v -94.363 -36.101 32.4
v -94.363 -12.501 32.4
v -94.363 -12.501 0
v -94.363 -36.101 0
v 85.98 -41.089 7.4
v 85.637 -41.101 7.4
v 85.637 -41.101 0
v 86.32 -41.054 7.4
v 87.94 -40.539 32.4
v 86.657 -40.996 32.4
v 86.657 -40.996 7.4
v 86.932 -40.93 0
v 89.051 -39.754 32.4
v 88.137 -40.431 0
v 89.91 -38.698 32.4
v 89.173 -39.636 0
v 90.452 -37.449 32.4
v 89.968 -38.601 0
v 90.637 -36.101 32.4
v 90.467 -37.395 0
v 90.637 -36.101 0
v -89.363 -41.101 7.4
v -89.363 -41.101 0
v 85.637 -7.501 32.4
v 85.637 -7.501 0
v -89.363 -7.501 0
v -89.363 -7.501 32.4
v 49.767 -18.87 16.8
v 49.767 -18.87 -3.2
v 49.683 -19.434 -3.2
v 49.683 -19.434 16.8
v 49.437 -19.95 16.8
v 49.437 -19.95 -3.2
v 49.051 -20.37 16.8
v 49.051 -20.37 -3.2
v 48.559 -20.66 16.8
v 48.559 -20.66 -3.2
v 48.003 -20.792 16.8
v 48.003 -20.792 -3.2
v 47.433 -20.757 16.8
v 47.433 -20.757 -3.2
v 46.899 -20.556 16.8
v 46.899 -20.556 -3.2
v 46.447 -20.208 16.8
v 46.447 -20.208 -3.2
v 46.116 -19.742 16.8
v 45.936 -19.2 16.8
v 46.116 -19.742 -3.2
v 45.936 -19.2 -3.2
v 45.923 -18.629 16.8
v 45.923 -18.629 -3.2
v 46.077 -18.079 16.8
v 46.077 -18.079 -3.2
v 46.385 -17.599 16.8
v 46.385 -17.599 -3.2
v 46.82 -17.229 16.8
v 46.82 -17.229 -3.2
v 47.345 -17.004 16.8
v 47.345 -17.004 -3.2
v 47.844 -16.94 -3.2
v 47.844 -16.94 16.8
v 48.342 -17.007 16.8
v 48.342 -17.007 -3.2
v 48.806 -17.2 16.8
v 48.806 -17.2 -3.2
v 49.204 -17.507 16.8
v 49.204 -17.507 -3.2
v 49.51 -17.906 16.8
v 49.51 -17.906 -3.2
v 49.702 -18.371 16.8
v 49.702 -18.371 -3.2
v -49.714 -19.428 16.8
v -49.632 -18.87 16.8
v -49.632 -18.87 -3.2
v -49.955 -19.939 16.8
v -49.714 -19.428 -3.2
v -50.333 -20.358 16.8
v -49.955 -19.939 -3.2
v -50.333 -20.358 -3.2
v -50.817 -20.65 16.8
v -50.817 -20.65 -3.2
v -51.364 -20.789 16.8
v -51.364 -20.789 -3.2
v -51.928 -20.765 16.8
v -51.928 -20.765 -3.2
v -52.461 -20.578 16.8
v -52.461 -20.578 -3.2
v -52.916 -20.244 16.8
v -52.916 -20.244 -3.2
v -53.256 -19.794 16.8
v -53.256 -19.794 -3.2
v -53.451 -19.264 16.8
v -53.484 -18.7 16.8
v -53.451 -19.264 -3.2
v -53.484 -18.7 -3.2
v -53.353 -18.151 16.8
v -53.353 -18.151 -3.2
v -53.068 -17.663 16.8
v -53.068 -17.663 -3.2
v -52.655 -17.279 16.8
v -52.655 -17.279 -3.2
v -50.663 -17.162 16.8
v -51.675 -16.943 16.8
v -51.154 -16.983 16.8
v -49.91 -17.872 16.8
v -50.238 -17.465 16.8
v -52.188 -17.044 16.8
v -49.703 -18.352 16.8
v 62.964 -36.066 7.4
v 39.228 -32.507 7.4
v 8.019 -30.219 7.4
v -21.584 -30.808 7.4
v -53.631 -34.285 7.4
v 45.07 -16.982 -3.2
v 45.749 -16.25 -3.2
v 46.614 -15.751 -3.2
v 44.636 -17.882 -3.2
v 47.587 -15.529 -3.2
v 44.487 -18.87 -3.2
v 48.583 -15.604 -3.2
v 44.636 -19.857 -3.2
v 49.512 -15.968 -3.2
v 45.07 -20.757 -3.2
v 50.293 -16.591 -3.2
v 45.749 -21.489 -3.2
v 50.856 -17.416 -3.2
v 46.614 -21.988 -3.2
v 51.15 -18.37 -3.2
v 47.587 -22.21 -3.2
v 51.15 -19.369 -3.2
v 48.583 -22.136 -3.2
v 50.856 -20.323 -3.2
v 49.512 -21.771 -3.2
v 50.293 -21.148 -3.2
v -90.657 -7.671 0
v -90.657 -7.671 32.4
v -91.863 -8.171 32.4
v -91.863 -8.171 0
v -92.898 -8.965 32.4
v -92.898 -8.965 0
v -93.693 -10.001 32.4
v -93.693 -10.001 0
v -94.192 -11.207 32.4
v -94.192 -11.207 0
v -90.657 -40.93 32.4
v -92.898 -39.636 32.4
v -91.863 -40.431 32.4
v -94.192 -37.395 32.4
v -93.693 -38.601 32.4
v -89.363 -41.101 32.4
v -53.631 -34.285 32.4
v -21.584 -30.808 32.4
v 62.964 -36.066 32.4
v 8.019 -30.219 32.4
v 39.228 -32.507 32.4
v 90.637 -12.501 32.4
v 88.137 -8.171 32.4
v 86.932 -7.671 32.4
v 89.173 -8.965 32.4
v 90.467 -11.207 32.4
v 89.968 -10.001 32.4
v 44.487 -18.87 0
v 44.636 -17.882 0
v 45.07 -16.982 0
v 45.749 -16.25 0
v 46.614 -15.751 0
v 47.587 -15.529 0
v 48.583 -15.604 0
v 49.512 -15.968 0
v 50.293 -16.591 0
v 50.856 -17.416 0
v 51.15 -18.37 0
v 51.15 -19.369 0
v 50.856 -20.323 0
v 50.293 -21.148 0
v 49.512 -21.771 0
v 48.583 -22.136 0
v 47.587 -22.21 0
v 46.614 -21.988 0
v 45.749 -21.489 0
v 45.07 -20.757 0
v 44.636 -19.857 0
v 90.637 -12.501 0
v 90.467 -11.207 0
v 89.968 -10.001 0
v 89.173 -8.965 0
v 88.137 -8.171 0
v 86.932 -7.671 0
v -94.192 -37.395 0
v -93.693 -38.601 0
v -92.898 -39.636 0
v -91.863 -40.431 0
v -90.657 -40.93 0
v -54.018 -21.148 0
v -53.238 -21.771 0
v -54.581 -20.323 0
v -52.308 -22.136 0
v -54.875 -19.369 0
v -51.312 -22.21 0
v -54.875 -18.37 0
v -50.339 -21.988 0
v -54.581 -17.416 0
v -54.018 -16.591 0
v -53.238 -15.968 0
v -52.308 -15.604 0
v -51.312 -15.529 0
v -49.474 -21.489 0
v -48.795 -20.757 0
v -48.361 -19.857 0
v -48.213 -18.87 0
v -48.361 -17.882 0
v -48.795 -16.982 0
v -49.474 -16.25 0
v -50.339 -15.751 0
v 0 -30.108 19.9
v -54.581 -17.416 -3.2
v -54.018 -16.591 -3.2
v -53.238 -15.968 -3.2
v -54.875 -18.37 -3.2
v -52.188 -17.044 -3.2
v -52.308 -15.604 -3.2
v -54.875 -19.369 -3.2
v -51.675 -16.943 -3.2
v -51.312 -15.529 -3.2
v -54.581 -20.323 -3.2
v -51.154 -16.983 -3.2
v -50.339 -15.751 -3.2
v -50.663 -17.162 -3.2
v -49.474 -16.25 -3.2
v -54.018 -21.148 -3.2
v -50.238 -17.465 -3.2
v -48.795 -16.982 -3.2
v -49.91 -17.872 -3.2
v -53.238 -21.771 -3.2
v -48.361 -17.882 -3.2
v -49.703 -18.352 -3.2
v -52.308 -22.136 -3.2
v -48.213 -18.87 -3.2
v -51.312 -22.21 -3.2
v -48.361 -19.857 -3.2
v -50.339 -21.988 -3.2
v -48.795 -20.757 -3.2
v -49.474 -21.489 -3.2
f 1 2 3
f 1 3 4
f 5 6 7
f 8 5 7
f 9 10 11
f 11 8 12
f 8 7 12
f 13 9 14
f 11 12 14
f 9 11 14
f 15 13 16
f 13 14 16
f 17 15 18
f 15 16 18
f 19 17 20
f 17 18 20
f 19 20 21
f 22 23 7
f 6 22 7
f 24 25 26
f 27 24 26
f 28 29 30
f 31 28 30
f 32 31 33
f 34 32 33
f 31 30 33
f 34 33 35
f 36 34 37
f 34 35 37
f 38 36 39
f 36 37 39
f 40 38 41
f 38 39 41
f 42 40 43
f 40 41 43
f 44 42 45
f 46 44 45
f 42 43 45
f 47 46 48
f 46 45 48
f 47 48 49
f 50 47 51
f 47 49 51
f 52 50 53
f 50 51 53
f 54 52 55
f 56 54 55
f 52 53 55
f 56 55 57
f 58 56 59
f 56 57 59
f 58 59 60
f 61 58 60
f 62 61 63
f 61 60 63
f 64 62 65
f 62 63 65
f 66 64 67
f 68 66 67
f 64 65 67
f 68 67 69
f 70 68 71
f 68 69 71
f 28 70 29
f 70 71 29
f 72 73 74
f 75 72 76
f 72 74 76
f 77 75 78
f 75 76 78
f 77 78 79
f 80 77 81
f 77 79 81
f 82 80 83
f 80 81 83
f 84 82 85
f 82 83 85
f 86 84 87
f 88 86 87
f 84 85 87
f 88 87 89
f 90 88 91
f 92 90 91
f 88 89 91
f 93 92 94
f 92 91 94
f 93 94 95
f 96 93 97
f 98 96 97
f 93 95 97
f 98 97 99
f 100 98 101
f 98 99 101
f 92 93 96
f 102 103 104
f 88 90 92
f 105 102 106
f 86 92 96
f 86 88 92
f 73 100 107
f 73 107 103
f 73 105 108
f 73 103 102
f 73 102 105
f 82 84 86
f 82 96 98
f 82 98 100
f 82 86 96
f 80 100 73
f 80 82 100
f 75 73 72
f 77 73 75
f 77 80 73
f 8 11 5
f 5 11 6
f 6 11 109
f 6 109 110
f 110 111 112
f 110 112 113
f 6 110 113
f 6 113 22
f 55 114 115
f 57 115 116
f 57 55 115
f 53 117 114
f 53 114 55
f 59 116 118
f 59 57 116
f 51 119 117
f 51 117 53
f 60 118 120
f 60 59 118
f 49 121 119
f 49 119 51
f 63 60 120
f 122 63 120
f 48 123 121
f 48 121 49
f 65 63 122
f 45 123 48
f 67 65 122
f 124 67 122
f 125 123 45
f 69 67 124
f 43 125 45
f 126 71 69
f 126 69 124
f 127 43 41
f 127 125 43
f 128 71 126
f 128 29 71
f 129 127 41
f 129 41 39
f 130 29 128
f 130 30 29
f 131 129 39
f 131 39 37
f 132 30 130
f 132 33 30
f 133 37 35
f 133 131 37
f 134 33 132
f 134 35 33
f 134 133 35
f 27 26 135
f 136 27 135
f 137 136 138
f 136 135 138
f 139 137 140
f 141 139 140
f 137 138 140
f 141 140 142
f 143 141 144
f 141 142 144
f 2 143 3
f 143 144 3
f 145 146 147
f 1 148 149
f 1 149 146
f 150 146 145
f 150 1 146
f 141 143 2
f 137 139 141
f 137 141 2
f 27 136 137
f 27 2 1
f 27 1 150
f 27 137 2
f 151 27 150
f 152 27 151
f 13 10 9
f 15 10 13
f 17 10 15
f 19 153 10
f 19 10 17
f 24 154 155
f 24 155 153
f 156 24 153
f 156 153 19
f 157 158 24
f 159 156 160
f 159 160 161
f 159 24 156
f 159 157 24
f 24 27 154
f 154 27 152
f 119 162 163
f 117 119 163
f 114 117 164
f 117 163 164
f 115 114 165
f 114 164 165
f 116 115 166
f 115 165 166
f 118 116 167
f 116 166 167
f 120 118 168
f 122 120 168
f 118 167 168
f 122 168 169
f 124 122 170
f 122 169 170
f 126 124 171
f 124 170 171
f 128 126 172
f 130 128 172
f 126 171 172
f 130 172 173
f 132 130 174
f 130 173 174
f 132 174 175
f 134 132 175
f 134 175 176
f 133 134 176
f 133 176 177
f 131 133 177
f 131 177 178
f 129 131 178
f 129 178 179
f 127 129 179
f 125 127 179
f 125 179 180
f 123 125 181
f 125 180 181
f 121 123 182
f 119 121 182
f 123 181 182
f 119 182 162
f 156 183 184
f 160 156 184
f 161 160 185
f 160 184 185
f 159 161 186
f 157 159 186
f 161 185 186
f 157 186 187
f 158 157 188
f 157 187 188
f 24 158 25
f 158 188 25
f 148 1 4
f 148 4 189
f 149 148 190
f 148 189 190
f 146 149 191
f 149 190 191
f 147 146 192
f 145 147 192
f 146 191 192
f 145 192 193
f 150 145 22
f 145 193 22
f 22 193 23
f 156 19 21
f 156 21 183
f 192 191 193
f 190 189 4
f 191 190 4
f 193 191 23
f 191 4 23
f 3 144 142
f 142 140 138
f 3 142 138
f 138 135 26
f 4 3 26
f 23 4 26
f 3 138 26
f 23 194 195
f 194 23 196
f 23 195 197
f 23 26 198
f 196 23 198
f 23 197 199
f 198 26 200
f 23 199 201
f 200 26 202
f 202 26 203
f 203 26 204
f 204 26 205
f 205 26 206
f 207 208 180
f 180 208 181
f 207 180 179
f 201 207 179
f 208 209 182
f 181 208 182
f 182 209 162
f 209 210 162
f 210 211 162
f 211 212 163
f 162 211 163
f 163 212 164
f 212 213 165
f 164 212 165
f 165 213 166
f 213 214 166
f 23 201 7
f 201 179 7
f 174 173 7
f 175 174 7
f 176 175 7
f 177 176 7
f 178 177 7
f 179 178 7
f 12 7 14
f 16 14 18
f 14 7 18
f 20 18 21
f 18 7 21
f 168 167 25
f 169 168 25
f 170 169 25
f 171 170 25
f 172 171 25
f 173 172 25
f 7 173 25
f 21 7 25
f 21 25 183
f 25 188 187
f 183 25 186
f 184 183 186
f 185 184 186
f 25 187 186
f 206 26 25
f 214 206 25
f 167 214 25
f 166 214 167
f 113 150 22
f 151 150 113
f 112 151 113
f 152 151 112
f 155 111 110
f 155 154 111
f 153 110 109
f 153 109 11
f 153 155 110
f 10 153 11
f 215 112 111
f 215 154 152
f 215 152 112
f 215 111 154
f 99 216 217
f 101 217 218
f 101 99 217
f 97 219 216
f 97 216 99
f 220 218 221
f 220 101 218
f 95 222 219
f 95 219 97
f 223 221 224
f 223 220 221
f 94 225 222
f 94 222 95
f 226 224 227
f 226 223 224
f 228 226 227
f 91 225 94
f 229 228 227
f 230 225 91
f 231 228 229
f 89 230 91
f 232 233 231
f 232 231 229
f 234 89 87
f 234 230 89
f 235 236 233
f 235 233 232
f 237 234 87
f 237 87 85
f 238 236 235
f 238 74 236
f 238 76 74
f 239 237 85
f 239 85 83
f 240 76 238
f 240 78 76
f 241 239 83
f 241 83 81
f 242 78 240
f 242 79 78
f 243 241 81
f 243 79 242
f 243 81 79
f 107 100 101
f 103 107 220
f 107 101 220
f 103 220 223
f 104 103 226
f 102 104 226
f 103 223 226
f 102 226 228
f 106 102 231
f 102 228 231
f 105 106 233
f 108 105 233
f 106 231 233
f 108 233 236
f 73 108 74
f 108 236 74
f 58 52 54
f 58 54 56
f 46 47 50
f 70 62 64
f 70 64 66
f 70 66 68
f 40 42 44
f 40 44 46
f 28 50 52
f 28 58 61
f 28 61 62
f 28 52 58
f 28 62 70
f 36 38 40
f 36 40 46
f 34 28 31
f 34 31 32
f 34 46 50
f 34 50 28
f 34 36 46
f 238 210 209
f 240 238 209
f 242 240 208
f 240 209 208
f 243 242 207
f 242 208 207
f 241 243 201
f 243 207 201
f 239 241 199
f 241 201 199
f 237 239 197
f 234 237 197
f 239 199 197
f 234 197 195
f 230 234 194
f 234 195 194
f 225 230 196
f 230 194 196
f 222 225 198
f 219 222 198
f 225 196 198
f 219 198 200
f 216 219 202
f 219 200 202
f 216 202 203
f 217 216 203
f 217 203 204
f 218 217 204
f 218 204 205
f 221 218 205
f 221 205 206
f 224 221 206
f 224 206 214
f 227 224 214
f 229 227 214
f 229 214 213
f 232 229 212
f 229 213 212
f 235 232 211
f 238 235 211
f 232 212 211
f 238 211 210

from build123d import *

# Parameters (mm, degrees)
F1_DEPTH = 32.4
F3_DEPTH = 25
F5_DEPTH = 3.2
F7_DEPTH = 20


# Not quite as in the source:
# - a feature names something its author has since deleted; it is built from what else it names


with BuildPart() as f1:
    # F0 (on Top) → F1 (new body)
    with BuildSketch(Plane.XY):
        with BuildLine():
            Line((85.6374964118, -7.5007802074), (-89.3625035882, -7.5007802074))
            ThreePointArc((-89.3625035882, -7.5007802074), (-92.8980374941, -8.9652463014), (-94.3625035882, -12.5007802074))
            Line((-94.3625035882, -12.5007802074), (-94.3625035882, -36.1007802074))
            ThreePointArc((-94.3625035882, -36.1007802074), (-92.8980374941, -39.6363141133), (-89.3625035882, -41.1007802074))
            add(Edge.make_bspline(
                [(-89.3625035882, -41.1007802074), (-59.4132024584, -34.6381396439), (-0.1322912347, -21.8461476087), (57.2468589299, -34.7273087443), (85.6374964118, -41.1007802074)],
                knots=[0, 0, 0, 0, 0.5052098646, 1, 1, 1, 1], degree=3))
            ThreePointArc((85.6374964118, -41.1007802074), (89.1730303177, -39.6363141133), (90.6374964118, -36.1007802074))
            Line((90.6374964118, -36.1007802074), (90.6374964118, -12.5007802074))
            ThreePointArc((90.6374964118, -12.5007802074), (89.1730303177, -8.9652463014), (85.6374964118, -7.5007802074))
        make_face()
        with BuildLine():
            add(Edge.make_bspline(
                [(-89.3625035882, -41.1007802074), (-59.4132024584, -34.6381396439), (-0.1322912347, -21.8461476087), (57.2468589299, -34.7273087443), (85.6374964118, -41.1007802074)],
                knots=[0, 0, 0, 0, 0.5052098646, 1, 1, 1, 1], degree=3))
            Line((-89.3625035882, -41.1007802074), (85.6374964118, -41.1007802074))
        make_face()
    extrude(amount=F1_DEPTH)

    # F2 (on face) → F3 (cut)
    with BuildSketch(Plane.XY.offset(32.4)):
        with BuildLine():
            add(Edge.make_bspline(
                [(-89.3625035882, -41.1007802074), (-59.456438476, -34.254019451), (-0.1066600814, -25.9658719218), (57.8851377231, -34.2465879534), (86.657191818, -40.9956981105)],
                knots=[0, 0, 0, 0, 0.5038023595, 1, 1, 1, 1], degree=3))
            Line((-89.3625035882, -41.1007802074), (85.6374964118, -41.1007802074))
            ThreePointArc((85.6374964118, -41.1007802074), (86.1500442068, -41.0744403041), (86.657191818, -40.9956981105))
        make_face()
    extrude(amount=-F3_DEPTH, mode=Mode.SUBTRACT)

    # F4 (on face) → F5 (join)
    with BuildSketch(Plane(origin=(0, 0, 0), x_dir=(1, 0, 0), z_dir=(0, 0, -1))):
        with BuildLine():
            Line((-51.5625035882, 18.8695881516), (-54.9125035882, 18.8695881516))
            ThreePointArc((-54.9125035882, 18.8695881516), (-51.5625035882, 15.5195881516), (-48.2125035882, 18.8695881516))
            Line((-48.2125035882, 18.8695881516), (-51.5625035882, 18.8695881516))
        make_face()
        with BuildLine():
            ThreePointArc((-48.2125035882, 18.8695881516), (-51.5625035882, 22.2195881516), (-54.9125035882, 18.8695881516))
            Line((-54.9125035882, 18.8695881516), (-51.5625035882, 18.8695881516))
            Line((-51.5625035882, 18.8695881516), (-48.2125035882, 18.8695881516))
        make_face()
        with BuildLine():
            ThreePointArc((51.1874964118, 18.8695881516), (47.8374964118, 22.2195881516), (44.4874964118, 18.8695881516))
            Line((44.4874964118, 18.8695881516), (47.8374964118, 18.8695881516))
            Line((47.8374964118, 18.8695881516), (51.1874964118, 18.8695881516))
        make_face()
        with BuildLine():
            Line((47.8374964118, 18.8695881516), (44.4874964118, 18.8695881516))
            ThreePointArc((44.4874964118, 18.8695881516), (47.8374964118, 15.5195881516), (51.1874964118, 18.8695881516))
            Line((51.1874964118, 18.8695881516), (47.8374964118, 18.8695881516))
        make_face()
    extrude(amount=F5_DEPTH)

    # F6 (on face) → F7 (cut)
    with BuildSketch(Plane(origin=(0, 0, -3.2), x_dir=(1, 0, 0), z_dir=(0, 0, -1))):
        with BuildLine():
            ThreePointArc((49.7674964118, 18.8695881516), (46.6597964296, 20.3986148851), (47.3447785341, 17.0035417714))
            ThreePointArc((47.3447785341, 17.0035417714), (49.015196394, 17.340561418), (49.7674964118, 18.8695881516))
        make_face()
        with BuildLine():
            ThreePointArc((-52.6547781922, 17.2789104499), (-50.6630550607, 17.1616089388), (-49.6317802739, 18.8695881516))
            ThreePointArc((-49.6317802739, 18.8695881516), (-52.4605054871, 20.5775673643), (-52.6547781922, 17.2789104499))
        make_face()
    extrude(amount=-F7_DEPTH, mode=Mode.SUBTRACT)


solid = f1.part
